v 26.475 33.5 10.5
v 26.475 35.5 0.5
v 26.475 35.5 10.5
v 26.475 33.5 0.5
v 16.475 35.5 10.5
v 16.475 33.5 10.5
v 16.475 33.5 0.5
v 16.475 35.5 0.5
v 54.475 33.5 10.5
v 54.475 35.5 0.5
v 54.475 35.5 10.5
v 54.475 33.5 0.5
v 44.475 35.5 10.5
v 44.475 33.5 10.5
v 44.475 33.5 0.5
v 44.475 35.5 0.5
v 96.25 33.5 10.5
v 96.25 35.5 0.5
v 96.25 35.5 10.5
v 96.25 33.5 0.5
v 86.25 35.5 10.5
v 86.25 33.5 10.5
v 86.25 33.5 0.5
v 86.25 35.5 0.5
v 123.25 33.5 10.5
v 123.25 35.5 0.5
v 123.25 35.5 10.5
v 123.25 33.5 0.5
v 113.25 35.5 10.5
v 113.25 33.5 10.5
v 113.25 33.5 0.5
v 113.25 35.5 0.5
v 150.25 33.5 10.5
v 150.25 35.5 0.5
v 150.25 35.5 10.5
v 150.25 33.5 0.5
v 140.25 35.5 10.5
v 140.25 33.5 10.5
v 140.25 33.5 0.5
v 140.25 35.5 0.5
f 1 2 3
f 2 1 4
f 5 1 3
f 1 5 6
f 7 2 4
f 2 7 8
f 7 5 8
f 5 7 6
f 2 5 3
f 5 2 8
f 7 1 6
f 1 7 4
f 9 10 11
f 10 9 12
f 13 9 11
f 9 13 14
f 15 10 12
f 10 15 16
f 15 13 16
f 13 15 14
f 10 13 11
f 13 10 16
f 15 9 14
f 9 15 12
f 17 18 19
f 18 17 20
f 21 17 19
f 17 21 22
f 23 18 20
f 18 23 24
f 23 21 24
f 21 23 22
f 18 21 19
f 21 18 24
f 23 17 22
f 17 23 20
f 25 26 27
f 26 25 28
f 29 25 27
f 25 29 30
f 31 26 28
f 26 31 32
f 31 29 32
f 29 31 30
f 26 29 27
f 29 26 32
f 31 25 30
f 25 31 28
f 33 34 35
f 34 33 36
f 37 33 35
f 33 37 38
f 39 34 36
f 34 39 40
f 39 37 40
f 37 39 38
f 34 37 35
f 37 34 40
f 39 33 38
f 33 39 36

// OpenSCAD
// file: common_modules.scad
include <parameters.scad>

// Draw the WS8212 PCBs footprints in the frame
module footprints()
{
    union() {
        for (i = [0:notes_count-1]) {
            falling = is_prev_black(i);
            rising  = is_next_black(i);

            // White key alone
            if (!falling && !rising && enable_w_footprints)
            {
                dx = (white_key_x(i+1) + white_key_x(i) - fp_width) / 2;
                dy = low_height() + pl_thickness_y - fp_height;
                dz = (pl_depth - fp_depth) / 2;
                translate([dx, dy, dz]) cube([fp_width, fp_height, fp_depth]);
            }

            // White key followed by black key, print footprint on white key
            if (!falling && rising  && enable_w_footprints)
            {
                w_key_x = white_key_x_nogap(i);
                dx = (black_key_x(i) + w_key_x - pl_thickness_x - pl_margin - fp_width) / 2;
                dy = low_height() + pl_thickness_y - fp_height;
                dz = (pl_depth - fp_depth) / 2;
                translate([dx, dy, dz]) cube([fp_width, fp_height, fp_depth]);
            }

            // White key precedeed by black key, print footprint on white key
            if (falling && !rising  && enable_w_footprints)
            {
                w_key_x = white_key_x(i+1) - w_gap/2;
                dx = (w_key_x + black_key_x(i-1) + b_width_low + pl_thickness_x + pl_margin - fp_width) / 2;
                dy = low_height() + pl_thickness_y - fp_height;
                dz = (pl_depth - fp_depth) / 2;
                translate([dx, dy, dz]) cube([fp_width, fp_height, fp_depth]);
            }

            // White key between two black keys, print footprint on white key
            if (falling && rising && enable_w_footprints)
            {
                // Position to the middle of black keys:
                dx = (black_key_x(i) + black_key_x(i-1) + b_width_low - fp_width) / 2;
                dy = low_height() + pl_thickness_y - fp_height;
                dz = (pl_depth - fp_depth) / 2;
                translate([dx, dy, dz]) cube([fp_width, fp_height, fp_depth]);
            }

            // Print footprint on black key
            if (rising)
            {
                // Footprint on black key
                dx2 = black_key_x(i) + (b_width_low - fp_width)/ 2;
                dy2 = high_height() + pl_thickness_y - fp_height;
                dz2 = (pl_depth - fp_depth) / 2;
                translate([dx2, dy2, dz2]) cube([fp_width, fp_height, fp_depth]);
            }
        }
    }
}

// determine the height (y axis) where the pianoled touches the keyboard
function low_height() = pl_height > (b_height - w_height) ? w_height : (b_height - pl_height);

// determine the height (y axis) where the pianoled top edge is
function high_height() = pl_height > (b_height - w_height) ? w_height + pl_height : low_height() + pl_height;

// return the x position of left side of black key i
function black_key_x(i) =
    (i+1) * (w_width + w_gap) - b_width_low / 2 + get_b_jitter(i);

// return the x position of left side of white key i, including gap
function white_key_x(i) =
    i * (w_width + w_gap);

// return the x position of left side of white key i, excluding gap
function white_key_x_nogap(i) =
    i * (w_width + w_gap) + w_gap / 2;

// return true if white key i a C
function is_c(i) =
(
    ((i+first_note)%7 == 0)
);

// return true if white key i a E
function is_e(i) =
(
    ((i+first_note)%7 == 2)
);

// return true if white key i a F
function is_f(i) =
(
    ((i+first_note)%7 == 3)
);

// return true if white key i a B
function is_b(i) =
(
    ((i+first_note)%7 == 6)
);

// return true if this is white key i the last of the keyboard
function is_last_white(i) =
(
    (i + 1 == notes_count)
);

// return true if this is white key i the first of the keyboard
function is_first_white(i) =
(
    (i == 0)
);

// return true if there is a black key before white key i
function is_prev_black(i) =
(
    (!is_first_white(i) && !is_c(i) && !is_f(i))
);

// return true if there is a black key after white key i
function is_next_black(i) =
(
    (!is_last_white(i) && !is_e(i) && !is_b(i))
);

// calculate x offset of black key
function get_b_jitter(i) =
(
    b_jitters[(i+first_note)%7]
);
// file: parameters.scad
// White keys geometry
w_width  = 22.65; // x axis
w_height = 20;    // y axis
w_depth  = 150;   // z axis
w_gap    = 1;     // Distance between two white keys

// Black keys geometry
// *_high is at the shape of the top of the black key
// *_low is at the shape of the bottom of the black key
b_width_low   = 15;
b_height_low  = 24;
b_depth_low   = 90;
b_width_high  = 9.5;
b_depth_high  = 50;
b_height_high = 11+(w_height-b_height_low);
b_height      = b_height_low + b_height_high;
b_width       = b_width_low;
b_jitters     = [-2.175 , 2.175 , 0 , -3.35 , 0 , 3.35 , 0]; // Offset on x axis of black keys, starting from middle position

// Pianoled stuff parameters
pl_depth  = 11;       // z axis size
pl_height = 11.5;     // y size, excludes thickness
pl_margin = 0.5;      // x axis margin near black keys
pl_thickness_x = 1.5; // vertical thickness on x axis
pl_thickness_y = 4;   // horizontal thickness on y axis
pl_thickness_z = 2;   // horizontal thickness on z axis (ie bars)

// PCB footprint parameters
fp_width    = 10;
fp_height   = 2;
fp_depth    = 10;

// Cable guides parameters
cable_width = 1; // width of the guide
cable_height = 2; // height of the guide
cable_length = 168; // length of the guide

// Define first note and number of white keys
first_note  = 0; // 0 is C, 1 is D, etc...
notes_count = 7; // Number of white keys to draw
// main file
include <parameters.scad>
include <common_modules.scad>

// disable footprints on white keys
enable_w_footprints = false;

footprints();
